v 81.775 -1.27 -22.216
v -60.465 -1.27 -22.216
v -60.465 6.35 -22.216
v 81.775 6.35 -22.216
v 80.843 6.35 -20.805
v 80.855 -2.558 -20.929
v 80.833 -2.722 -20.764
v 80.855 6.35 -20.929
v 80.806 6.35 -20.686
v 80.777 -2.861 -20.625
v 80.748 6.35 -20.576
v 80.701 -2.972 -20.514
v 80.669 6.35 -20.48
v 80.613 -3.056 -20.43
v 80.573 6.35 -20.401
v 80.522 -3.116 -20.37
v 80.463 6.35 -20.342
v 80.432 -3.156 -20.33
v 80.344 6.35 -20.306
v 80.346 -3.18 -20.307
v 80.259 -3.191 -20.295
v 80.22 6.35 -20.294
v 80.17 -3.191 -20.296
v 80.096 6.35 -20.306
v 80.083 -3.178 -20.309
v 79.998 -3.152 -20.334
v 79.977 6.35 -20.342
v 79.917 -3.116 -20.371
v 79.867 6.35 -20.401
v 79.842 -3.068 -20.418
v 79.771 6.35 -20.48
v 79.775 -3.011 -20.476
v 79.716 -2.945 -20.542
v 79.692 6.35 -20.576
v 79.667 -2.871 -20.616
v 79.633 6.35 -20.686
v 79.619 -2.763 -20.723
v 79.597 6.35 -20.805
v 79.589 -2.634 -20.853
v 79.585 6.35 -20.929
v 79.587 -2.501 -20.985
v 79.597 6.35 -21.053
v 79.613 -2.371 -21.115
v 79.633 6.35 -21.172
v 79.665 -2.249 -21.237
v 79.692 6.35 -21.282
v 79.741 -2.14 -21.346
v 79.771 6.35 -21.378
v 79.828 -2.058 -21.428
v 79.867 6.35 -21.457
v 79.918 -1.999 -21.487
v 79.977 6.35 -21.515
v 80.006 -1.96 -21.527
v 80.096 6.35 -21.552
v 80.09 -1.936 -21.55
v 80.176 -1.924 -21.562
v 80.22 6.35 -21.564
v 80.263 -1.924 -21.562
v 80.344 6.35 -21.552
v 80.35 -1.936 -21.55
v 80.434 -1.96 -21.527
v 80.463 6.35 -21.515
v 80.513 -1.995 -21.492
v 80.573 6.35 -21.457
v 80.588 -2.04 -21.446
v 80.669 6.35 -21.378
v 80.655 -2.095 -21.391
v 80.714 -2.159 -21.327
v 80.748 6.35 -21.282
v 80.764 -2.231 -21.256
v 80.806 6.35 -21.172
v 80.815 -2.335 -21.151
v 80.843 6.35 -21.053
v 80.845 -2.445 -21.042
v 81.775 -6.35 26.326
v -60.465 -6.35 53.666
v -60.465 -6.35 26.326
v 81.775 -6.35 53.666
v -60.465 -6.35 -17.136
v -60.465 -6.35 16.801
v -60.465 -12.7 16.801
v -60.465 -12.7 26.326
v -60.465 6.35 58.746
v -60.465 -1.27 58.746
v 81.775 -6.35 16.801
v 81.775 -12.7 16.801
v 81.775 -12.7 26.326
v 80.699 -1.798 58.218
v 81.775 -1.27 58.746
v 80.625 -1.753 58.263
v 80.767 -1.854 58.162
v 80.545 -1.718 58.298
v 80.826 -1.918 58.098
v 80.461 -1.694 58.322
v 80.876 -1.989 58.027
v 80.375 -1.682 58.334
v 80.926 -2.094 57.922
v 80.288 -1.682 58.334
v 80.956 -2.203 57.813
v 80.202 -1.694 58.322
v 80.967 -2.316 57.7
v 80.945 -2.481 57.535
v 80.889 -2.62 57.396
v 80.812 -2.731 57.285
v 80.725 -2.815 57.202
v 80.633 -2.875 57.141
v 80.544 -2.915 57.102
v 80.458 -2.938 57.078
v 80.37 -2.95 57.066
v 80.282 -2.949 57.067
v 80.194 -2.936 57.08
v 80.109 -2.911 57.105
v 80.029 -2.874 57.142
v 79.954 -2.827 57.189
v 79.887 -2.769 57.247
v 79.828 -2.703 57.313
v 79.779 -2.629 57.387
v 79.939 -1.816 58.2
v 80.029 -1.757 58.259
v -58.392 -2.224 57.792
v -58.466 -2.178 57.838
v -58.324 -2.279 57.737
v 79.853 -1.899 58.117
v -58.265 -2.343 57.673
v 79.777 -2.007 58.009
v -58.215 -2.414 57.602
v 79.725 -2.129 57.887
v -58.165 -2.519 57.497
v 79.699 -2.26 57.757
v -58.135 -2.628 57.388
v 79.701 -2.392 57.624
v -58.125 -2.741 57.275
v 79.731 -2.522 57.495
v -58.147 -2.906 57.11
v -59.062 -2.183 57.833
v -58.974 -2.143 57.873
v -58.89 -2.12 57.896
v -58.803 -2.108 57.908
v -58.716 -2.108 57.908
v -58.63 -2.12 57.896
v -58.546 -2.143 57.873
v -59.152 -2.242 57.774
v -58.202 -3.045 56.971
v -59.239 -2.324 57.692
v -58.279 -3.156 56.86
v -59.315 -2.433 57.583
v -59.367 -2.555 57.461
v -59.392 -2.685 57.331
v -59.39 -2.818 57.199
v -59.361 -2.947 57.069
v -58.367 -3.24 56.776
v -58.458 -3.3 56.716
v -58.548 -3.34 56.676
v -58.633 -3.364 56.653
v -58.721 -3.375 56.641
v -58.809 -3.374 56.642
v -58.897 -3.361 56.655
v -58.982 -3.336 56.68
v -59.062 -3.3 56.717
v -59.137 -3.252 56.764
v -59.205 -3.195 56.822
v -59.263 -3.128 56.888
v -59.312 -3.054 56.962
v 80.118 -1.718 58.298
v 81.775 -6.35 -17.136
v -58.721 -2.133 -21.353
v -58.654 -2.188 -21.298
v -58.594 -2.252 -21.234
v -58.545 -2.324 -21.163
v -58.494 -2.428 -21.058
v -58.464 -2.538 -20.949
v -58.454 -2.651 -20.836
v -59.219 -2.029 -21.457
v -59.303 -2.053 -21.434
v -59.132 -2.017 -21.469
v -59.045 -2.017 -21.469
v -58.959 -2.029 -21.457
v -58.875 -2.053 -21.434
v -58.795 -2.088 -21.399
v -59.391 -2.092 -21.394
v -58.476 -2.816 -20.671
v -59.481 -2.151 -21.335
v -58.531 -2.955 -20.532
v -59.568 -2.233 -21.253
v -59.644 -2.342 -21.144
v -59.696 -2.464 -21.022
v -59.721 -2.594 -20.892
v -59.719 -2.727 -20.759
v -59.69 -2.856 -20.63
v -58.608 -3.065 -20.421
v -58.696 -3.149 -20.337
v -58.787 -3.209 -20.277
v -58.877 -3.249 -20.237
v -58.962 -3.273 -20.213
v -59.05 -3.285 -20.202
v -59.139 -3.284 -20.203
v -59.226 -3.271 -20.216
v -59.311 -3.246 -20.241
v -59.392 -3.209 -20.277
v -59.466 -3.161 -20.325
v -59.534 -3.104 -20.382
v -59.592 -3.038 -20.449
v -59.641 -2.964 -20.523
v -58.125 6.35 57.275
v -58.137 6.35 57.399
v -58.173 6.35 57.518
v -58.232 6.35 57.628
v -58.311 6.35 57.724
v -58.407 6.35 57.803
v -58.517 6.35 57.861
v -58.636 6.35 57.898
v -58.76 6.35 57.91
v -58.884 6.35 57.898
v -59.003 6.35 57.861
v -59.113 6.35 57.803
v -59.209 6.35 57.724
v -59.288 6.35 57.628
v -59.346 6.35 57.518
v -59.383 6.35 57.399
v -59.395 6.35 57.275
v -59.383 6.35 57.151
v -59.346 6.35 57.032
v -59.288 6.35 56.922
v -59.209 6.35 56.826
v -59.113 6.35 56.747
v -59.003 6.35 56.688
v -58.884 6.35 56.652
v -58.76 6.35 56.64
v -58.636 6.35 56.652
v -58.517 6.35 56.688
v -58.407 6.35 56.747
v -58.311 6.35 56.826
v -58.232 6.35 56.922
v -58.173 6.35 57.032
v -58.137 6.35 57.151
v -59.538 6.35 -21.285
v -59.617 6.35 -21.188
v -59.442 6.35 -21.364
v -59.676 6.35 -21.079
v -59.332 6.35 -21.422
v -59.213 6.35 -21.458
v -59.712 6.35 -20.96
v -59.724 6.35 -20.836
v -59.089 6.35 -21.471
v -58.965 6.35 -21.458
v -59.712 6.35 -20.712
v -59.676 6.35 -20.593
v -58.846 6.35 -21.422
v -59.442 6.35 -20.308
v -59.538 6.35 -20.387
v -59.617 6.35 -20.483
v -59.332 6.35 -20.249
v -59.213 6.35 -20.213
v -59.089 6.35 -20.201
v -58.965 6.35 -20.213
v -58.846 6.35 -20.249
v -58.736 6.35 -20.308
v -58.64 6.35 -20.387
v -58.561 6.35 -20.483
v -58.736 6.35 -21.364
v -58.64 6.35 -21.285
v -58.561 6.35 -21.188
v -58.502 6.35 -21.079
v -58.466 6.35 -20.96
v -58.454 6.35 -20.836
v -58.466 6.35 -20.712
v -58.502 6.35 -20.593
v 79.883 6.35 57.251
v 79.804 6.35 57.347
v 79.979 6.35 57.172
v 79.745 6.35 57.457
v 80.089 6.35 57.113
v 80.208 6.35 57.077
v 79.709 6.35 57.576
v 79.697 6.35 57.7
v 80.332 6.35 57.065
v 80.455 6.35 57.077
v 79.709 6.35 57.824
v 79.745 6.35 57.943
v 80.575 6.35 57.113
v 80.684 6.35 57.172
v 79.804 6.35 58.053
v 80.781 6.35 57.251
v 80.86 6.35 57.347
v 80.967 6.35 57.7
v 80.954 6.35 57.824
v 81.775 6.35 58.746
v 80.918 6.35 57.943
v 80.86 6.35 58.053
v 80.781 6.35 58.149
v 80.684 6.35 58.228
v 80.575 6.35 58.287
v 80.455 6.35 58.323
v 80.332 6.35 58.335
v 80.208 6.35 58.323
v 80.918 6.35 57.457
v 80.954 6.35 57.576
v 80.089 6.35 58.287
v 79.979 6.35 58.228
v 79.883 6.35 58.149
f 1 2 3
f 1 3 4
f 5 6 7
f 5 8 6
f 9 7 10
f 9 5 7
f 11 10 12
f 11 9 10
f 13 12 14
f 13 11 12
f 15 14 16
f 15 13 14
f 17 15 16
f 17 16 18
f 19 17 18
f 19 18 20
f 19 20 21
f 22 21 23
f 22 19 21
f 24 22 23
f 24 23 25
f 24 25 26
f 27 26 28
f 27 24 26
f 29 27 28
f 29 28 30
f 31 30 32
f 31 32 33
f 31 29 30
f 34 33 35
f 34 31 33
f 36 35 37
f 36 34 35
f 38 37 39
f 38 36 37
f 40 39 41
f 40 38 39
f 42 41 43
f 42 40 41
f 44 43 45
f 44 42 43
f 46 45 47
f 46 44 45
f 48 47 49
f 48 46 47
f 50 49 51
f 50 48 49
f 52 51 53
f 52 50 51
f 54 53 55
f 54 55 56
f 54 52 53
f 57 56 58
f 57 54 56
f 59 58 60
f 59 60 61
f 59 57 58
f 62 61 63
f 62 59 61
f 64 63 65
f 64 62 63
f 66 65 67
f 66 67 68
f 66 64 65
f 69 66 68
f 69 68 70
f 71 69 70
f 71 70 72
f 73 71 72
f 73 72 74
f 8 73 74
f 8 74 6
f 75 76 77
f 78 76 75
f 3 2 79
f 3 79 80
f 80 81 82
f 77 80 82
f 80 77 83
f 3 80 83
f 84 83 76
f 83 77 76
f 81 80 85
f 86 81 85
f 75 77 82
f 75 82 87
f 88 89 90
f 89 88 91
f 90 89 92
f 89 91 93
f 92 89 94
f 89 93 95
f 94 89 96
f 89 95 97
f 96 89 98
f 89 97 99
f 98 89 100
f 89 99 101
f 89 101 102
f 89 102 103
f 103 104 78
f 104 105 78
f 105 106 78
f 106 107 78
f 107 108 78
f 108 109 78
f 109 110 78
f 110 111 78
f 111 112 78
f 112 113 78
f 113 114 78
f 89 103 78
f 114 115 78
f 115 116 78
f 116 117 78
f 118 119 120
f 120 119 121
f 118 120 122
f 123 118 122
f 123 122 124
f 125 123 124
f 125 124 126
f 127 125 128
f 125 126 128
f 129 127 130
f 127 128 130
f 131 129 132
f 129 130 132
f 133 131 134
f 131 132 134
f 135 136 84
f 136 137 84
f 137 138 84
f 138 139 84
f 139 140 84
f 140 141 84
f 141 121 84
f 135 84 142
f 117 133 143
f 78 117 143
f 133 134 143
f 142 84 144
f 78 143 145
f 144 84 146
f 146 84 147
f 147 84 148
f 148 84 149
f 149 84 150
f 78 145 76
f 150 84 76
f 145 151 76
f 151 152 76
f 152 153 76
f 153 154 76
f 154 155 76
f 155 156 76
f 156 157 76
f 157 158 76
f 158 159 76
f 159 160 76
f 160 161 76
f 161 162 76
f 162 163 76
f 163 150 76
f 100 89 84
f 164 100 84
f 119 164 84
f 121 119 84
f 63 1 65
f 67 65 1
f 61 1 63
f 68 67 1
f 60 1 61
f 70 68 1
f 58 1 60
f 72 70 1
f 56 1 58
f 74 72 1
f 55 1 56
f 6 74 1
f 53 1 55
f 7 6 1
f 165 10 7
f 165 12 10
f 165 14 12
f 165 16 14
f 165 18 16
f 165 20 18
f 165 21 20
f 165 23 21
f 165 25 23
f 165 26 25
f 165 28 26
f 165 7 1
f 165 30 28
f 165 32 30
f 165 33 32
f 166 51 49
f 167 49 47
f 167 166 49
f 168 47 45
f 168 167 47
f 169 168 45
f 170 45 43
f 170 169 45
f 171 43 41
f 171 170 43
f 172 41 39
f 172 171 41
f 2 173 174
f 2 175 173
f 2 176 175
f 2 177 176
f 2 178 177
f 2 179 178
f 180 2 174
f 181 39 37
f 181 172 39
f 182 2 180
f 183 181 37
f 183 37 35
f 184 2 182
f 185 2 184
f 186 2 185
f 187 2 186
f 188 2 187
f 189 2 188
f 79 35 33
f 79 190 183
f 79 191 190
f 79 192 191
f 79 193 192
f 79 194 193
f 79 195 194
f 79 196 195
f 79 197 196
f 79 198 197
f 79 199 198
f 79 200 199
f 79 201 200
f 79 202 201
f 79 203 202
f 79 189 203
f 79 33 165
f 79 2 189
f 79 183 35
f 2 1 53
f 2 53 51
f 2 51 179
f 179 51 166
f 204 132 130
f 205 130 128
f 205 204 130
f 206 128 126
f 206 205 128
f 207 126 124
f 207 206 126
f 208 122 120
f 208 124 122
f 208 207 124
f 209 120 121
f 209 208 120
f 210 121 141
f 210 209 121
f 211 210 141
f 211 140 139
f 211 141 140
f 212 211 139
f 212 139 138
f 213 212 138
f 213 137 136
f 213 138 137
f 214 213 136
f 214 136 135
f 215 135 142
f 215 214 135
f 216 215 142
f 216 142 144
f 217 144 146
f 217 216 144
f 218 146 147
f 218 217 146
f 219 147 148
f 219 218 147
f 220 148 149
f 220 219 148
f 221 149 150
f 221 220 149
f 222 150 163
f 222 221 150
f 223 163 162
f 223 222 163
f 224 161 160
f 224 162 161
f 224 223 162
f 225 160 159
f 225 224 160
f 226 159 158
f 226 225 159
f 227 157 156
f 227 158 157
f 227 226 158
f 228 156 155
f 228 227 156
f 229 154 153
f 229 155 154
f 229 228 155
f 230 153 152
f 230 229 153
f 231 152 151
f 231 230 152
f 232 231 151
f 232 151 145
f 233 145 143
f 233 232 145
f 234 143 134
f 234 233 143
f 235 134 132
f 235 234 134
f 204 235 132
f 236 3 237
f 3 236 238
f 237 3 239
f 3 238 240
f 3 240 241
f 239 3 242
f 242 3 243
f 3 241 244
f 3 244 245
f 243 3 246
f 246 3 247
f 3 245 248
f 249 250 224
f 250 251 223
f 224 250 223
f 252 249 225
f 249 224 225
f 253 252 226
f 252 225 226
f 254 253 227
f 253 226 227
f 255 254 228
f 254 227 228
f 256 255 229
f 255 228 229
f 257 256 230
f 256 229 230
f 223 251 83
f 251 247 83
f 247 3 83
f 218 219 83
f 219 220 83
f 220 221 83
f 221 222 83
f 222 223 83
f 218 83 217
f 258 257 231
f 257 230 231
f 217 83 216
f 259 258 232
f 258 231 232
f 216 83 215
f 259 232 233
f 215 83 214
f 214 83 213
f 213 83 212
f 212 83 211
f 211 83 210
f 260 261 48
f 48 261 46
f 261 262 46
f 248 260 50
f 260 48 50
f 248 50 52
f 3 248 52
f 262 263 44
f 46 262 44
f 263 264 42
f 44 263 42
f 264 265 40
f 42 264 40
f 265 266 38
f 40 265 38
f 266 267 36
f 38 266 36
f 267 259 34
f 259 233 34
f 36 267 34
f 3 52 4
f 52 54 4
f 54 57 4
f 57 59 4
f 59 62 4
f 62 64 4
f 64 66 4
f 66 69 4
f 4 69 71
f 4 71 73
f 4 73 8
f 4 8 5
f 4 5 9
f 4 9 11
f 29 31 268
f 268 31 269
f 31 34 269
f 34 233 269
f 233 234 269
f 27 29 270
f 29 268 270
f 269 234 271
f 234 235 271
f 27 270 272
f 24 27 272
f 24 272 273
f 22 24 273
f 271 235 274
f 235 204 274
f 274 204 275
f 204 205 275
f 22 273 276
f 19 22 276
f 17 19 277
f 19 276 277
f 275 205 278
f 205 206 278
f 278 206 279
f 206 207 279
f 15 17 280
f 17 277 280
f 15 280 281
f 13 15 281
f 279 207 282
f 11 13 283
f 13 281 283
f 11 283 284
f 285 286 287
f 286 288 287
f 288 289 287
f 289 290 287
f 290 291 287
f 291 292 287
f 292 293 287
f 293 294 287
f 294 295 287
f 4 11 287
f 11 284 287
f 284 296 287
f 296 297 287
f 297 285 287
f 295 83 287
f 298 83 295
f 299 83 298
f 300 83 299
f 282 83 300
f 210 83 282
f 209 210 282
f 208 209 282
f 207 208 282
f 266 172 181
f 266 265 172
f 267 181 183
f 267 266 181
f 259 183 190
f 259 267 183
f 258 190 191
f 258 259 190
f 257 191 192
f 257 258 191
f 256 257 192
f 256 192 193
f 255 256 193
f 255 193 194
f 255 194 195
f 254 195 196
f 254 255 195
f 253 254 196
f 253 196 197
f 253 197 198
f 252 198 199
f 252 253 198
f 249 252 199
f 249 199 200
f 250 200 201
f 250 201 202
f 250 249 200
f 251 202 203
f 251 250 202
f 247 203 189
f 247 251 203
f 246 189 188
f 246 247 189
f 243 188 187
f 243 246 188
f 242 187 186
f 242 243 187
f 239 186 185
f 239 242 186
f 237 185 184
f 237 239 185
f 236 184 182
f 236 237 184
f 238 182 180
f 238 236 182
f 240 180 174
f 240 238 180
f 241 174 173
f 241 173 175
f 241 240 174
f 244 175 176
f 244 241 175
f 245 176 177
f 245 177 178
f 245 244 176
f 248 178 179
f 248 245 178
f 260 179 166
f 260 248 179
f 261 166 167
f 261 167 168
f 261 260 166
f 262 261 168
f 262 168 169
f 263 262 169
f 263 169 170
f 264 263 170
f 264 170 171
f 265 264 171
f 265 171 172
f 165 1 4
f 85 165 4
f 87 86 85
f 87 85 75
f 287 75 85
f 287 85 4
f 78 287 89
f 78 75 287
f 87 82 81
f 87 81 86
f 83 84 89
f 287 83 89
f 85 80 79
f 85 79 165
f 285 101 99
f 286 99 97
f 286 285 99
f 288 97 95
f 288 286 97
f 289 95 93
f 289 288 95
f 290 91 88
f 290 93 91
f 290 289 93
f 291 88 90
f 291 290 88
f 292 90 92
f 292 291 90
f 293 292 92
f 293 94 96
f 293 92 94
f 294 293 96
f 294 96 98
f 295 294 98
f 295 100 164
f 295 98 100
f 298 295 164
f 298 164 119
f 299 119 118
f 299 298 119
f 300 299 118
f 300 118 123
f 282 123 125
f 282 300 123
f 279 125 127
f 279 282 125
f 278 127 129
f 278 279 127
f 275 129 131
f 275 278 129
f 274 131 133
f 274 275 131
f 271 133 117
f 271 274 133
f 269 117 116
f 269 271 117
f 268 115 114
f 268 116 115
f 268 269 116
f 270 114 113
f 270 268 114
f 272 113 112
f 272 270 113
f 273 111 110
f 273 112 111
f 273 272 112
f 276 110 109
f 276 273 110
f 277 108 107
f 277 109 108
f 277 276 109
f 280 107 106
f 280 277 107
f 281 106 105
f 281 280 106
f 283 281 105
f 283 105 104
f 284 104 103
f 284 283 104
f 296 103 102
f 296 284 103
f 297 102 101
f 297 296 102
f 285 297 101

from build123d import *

# Parameters (mm, degrees)
F0_W        = 142.24
F0_H        = 80.9625
F0_R        = 0.635
F1_DEPTH    = 6.35
F2_T1_DEPTH = 168.3682991577
F3_W        = 142.24
F3_H        = 9.525
F4_DEPTH    = 6.35


# Not quite as in the source:
# - a fillet or chamfer that OpenCascade refuses, or shapes differently, is made with other operations: its cross-section is extruded or revolved along the edge and cut away or added


with BuildPart() as f1:
    # F0 (on Front) → F1 (new body, symmetric)
    with BuildSketch(Plane.XZ):
        with Locations((10.6546021998, 18.2648575297)):
            Rectangle(F0_W, F0_H)
        with Locations((-59.0889267623, -20.8356846124)):
            Circle(F0_R, mode=Mode.SUBTRACT)
        with Locations((80.2197679877, -20.9288131446)):
            Circle(F0_R, mode=Mode.SUBTRACT)
        with Locations((-58.7598197162, 57.2748109698)):
            Circle(F0_R, mode=Mode.SUBTRACT)
        with Locations((80.3315266967, 57.7001310885)):
            Circle(F0_R, mode=Mode.SUBTRACT)
    extrude(amount=F1_DEPTH, both=True)

    # F2: chamfer of 5.08 on 2 edges, made by hand

    # F2_s2 → F2_t1 (cut)
    with BuildSketch(Plane.YZ.offset(-73.5295473791)):
        Polygon((-1.27, -22.2163924703), (-6.35, -17.1363924703), (-6.35, -22.2163924703), align=None)
        Polygon((-1.27, 58.7461075297), (-6.35, 53.6661075297), (-6.35, 58.7461075297), align=None)
    extrude(amount=F2_T1_DEPTH, mode=Mode.SUBTRACT)

    # F3 (on face) → F4 (join)
    with BuildSketch(Plane.XZ.offset(6.35)):
        with Locations((10.6546021998, 21.5639811352)):
            Rectangle(F3_W, F3_H)
    extrude(amount=F4_DEPTH)


solid = f1.part
